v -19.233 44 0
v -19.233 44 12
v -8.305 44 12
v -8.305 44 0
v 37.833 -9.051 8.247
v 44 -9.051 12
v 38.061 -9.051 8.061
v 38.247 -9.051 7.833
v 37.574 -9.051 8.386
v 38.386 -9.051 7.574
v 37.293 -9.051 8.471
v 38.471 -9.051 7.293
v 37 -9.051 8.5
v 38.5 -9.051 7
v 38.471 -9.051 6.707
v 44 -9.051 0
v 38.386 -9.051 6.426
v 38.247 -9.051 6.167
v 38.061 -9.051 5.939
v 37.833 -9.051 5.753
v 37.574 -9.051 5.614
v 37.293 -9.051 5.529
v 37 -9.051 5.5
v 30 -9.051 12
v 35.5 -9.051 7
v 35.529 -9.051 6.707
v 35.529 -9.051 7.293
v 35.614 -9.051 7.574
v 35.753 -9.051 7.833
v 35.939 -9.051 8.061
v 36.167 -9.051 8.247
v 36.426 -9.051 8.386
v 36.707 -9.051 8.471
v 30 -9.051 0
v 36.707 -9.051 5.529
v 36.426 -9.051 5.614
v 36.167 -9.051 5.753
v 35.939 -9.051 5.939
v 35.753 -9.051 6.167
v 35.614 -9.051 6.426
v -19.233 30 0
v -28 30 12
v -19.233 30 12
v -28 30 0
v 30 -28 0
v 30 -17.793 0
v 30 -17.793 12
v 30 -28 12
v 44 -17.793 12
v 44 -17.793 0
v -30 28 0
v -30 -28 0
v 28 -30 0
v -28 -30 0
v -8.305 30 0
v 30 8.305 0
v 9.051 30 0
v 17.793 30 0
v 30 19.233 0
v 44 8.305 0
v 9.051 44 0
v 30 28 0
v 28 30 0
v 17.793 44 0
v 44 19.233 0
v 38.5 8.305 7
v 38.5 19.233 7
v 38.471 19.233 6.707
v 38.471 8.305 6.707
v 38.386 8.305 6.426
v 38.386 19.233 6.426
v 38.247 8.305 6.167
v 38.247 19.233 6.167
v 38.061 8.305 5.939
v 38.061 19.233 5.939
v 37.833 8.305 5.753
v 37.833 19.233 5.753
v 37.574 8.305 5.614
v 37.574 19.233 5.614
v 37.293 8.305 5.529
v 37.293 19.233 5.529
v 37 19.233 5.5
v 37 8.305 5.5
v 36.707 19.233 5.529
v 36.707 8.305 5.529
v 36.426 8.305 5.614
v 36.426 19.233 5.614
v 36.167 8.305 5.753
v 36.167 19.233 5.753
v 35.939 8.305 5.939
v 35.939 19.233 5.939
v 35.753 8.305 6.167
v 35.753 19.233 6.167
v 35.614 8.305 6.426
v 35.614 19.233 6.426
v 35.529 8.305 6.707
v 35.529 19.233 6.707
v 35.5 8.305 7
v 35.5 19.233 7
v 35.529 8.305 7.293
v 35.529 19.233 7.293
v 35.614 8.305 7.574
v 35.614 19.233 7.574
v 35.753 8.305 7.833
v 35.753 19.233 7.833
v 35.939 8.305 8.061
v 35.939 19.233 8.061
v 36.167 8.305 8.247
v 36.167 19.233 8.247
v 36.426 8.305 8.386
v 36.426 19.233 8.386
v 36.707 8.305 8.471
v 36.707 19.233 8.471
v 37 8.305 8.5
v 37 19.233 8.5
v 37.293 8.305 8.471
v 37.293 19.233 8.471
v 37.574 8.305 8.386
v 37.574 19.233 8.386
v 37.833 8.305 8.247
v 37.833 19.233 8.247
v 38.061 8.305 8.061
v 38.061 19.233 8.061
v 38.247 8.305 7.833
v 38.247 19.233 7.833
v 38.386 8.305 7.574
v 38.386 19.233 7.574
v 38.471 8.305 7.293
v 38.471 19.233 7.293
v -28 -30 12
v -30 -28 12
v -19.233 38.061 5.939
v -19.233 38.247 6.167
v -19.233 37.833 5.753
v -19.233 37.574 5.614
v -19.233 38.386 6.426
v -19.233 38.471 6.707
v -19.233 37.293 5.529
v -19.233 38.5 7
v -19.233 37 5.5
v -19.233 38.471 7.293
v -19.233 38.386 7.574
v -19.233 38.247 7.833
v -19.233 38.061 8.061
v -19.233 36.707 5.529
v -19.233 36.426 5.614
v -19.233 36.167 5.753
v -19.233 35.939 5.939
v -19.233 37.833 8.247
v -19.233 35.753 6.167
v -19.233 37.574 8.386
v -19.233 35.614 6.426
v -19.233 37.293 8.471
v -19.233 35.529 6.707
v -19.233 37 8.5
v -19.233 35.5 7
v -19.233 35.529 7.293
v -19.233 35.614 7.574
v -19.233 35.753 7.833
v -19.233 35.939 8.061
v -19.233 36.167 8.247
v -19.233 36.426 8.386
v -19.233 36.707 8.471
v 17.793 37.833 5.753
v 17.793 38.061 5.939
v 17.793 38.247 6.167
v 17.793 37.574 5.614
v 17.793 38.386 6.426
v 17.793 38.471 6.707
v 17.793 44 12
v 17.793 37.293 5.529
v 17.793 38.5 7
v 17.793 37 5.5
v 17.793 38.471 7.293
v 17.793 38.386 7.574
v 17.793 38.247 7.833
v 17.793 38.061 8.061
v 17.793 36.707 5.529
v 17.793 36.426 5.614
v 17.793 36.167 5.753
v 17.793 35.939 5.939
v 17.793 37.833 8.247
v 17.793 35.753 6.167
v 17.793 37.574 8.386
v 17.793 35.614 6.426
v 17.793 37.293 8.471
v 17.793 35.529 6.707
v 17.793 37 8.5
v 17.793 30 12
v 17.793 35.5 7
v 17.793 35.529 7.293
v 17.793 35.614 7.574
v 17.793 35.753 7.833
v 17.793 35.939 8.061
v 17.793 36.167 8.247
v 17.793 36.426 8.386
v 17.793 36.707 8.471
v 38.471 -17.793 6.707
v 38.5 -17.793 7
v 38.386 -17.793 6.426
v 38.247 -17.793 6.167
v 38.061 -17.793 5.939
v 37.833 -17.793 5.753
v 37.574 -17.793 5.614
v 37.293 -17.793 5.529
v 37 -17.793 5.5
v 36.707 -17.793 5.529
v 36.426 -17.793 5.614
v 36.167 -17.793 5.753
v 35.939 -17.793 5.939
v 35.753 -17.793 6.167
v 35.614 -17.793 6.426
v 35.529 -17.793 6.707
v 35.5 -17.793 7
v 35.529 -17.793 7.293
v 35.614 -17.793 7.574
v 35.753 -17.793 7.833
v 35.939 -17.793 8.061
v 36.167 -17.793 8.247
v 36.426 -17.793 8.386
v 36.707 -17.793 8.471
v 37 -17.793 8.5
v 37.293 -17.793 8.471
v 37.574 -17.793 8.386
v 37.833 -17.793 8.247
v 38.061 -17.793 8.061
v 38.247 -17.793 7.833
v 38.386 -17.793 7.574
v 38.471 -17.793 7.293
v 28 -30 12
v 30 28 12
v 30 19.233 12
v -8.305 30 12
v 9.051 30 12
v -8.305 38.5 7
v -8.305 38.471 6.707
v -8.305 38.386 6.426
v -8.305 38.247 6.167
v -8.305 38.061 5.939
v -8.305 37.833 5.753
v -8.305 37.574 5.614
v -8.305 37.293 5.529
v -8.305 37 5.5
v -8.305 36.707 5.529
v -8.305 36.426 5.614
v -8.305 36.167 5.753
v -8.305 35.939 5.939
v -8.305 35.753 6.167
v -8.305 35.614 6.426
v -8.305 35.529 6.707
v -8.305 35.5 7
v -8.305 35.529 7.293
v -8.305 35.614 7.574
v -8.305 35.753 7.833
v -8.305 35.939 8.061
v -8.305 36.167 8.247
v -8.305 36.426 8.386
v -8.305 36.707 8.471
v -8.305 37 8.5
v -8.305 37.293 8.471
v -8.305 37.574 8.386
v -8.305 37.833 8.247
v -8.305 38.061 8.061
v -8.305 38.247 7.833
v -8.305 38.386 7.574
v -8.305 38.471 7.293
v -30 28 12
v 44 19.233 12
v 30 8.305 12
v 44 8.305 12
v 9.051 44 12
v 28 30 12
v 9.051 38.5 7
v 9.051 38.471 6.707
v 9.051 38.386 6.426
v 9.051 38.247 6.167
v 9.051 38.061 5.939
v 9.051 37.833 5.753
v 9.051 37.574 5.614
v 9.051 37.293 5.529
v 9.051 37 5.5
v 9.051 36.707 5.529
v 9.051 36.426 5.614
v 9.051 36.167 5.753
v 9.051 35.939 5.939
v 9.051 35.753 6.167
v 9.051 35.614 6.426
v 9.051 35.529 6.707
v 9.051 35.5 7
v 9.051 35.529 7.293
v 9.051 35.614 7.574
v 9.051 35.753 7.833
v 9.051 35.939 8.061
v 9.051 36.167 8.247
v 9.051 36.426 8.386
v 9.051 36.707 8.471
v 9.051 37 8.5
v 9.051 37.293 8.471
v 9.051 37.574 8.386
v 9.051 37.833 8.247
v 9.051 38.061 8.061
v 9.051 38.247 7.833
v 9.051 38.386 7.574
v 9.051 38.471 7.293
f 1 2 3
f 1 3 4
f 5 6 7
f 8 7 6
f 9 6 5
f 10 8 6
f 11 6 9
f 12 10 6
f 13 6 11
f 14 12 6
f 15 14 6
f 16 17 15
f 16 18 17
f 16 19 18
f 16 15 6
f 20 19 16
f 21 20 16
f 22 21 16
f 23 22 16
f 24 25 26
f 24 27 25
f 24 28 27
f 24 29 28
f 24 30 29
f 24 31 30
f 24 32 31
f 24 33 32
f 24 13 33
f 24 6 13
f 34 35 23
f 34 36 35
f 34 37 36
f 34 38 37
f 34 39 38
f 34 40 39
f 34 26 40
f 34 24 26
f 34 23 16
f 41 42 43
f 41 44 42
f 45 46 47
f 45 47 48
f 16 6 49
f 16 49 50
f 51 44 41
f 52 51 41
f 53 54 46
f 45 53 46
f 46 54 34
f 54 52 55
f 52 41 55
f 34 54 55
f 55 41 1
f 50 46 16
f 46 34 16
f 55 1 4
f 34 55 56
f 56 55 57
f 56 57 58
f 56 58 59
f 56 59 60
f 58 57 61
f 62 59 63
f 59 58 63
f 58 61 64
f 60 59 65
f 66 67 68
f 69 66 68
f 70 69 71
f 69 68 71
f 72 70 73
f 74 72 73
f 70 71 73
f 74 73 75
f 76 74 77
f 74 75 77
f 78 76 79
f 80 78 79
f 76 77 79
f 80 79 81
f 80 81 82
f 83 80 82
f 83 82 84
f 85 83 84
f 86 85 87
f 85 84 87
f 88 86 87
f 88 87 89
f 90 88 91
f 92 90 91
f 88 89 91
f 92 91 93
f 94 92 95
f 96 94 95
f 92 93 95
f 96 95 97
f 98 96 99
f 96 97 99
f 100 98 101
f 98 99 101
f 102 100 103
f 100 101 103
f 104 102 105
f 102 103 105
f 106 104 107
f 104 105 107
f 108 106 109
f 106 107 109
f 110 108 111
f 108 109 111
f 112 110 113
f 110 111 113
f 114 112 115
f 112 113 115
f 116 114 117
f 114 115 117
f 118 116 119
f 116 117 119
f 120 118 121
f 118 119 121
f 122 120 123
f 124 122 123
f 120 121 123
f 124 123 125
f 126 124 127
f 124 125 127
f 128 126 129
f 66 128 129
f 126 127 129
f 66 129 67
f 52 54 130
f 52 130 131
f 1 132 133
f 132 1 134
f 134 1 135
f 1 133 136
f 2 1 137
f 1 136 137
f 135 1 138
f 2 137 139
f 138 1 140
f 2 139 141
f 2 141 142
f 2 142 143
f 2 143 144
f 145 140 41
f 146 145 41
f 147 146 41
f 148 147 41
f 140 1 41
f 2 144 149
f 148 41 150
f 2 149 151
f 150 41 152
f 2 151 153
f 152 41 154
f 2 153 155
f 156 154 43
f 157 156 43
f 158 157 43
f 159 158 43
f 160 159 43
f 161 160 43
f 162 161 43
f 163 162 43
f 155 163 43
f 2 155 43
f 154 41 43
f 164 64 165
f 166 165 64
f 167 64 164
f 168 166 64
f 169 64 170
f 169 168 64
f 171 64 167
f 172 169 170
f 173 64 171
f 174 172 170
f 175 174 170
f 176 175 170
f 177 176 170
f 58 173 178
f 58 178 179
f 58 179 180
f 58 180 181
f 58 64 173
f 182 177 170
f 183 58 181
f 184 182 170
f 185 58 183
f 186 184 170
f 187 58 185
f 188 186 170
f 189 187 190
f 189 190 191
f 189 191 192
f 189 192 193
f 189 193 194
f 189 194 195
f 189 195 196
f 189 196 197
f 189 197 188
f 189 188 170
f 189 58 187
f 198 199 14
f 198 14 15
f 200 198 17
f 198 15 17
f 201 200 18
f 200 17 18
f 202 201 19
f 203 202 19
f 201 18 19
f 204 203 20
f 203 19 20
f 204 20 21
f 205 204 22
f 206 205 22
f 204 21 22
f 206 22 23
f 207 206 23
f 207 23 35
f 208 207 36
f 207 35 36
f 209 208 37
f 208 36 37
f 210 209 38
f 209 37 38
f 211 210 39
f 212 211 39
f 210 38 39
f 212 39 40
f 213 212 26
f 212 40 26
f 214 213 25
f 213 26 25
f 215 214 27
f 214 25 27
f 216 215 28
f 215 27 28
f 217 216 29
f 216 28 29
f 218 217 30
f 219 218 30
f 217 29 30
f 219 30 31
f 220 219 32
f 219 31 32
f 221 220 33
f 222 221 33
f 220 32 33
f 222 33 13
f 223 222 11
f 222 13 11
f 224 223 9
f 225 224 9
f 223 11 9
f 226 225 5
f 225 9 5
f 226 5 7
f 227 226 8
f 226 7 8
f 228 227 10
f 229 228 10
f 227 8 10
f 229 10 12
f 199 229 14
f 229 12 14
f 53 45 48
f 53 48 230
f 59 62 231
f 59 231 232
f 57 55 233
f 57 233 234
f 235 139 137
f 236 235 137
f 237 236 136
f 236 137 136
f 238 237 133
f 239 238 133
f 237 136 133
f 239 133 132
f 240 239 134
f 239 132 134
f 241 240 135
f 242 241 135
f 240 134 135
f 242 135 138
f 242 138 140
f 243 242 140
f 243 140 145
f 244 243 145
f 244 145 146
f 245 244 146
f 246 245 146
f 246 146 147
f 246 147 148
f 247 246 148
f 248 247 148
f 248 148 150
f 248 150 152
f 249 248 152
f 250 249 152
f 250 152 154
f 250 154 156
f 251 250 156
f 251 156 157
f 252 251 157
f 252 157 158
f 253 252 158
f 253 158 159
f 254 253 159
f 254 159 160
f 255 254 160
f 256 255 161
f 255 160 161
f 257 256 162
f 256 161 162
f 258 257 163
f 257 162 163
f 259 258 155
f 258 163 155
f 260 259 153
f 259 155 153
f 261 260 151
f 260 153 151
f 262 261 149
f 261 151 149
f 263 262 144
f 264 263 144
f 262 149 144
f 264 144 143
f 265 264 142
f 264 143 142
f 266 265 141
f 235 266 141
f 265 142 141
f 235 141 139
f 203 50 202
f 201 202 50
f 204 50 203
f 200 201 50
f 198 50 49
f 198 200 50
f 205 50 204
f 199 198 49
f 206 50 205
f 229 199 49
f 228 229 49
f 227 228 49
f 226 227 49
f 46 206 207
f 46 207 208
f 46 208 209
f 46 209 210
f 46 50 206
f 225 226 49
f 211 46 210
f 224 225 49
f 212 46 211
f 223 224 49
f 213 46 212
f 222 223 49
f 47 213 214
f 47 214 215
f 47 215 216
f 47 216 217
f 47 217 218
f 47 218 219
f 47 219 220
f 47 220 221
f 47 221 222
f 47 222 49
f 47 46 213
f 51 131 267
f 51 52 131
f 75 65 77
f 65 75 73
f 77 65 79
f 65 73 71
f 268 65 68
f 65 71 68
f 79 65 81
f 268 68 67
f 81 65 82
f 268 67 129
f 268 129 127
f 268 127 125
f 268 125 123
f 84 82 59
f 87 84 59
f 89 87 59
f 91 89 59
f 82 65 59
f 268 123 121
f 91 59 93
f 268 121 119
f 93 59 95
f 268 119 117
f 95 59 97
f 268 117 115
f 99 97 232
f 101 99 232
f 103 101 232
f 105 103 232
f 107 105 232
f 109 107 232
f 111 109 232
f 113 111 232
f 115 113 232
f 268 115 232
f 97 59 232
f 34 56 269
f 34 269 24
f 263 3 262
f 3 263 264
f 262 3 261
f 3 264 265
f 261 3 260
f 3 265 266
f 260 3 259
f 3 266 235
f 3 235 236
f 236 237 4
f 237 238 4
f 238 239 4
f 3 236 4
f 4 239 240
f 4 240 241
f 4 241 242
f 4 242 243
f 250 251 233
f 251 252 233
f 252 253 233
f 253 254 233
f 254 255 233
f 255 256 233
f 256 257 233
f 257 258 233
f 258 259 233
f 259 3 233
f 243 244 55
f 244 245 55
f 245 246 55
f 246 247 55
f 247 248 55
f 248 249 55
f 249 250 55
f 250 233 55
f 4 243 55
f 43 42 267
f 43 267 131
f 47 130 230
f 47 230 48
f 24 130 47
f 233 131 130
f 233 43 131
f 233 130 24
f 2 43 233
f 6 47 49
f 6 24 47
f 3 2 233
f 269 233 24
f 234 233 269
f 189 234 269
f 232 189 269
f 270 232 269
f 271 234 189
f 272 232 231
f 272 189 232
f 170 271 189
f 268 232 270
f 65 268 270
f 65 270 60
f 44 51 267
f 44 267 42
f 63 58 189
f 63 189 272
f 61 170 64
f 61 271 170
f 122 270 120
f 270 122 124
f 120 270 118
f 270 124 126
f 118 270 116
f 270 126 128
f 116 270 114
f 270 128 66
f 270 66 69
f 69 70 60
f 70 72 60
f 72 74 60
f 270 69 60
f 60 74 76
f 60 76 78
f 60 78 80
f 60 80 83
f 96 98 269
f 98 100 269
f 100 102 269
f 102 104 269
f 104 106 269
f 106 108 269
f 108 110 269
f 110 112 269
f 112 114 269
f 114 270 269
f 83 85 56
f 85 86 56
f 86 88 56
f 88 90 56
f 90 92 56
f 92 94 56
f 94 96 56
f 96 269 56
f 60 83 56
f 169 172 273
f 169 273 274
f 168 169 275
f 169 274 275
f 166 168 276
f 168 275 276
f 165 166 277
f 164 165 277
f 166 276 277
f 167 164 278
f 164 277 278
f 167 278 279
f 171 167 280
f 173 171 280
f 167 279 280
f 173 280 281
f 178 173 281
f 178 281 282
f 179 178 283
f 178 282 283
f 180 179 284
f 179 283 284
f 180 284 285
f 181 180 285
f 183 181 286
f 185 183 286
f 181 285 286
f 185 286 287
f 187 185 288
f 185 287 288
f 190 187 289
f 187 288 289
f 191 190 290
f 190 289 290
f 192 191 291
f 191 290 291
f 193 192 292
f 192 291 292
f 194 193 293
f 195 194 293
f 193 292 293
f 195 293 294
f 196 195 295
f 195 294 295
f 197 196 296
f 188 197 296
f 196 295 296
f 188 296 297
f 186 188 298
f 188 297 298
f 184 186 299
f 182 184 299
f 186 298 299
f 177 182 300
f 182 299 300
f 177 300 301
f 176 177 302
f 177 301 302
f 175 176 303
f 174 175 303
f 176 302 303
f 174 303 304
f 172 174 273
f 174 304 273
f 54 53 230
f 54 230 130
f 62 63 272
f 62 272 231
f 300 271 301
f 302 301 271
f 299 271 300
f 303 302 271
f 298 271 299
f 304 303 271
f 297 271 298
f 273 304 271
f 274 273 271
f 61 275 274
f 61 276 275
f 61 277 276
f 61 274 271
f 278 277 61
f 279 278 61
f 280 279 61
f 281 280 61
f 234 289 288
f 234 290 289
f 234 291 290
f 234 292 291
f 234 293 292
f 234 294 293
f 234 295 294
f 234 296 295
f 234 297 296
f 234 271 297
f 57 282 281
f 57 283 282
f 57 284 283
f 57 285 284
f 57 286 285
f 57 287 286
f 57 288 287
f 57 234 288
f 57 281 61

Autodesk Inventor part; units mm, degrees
ref_plane "YZ Plane" through (0, 0, 0) normal (1, 0, 0) x (0, 1, 0)
ref_plane "XZ Plane" through (0, 0, 0) normal (0, 1, 0) x (-1, 0, 0)
ref_plane "XY Plane" through (0, 0, 0) normal (0, 0, 1) x (1, 0, 0)
ref_plane "Work Plane1" through (0, 0, 0) normal (0, 0, 1) x (1, 0, 0)
sketch "Sketch1" plane through (0, 0, 0) normal (0, 0, 1) x (1, 0, 0)
  circle A0 centre (0, 0) radius 7.5 projected
  line L0 (-30, 28) -> (-28, 30) projected
  line L1 (-30, -28) -> (-30, 28) projected
  line L2 (-28, -30) -> (-30, -28) projected
  line L3 (28, -30) -> (-28, -30) projected
  line L4 (30, -28) -> (28, -30) projected
  line L5 (30, 28) -> (30, -28) projected
  line L6 (28, 30) -> (30, 28) projected
  line L7 (-28, 30) -> (28, 30) projected
  circle A1 centre (-25, 0) radius 1.3 projected
  circle A2 centre (25, 0) radius 1.3 projected
extrude "Extrusion1" add sketch "Sketch1" along normal blind 12 contours A0 | L0 L7 L6 L5 L4 L3 L2 L1 | A1 | A2
sketch "Sketch2" plane through (0, 0, 12) normal (0, 0, 1) x (1, 0, 0)
  point P0 (0, 0)
sketch "Sketch3" plane through (30, -28, 0) normal (1, 0, 0) x (0, 0, -1)
  line L0 (0, 56) -> (0, 0) projected
  line L1 (0, 56) -> (-12, 56) projected
  line L2 (-12, 0) -> (-12, 56) projected
  line L3 (0, 0) -> (-12, 0) projected
  line L4 (-12, 0) -> (-12, 56) projected
  line L5 (0, 47.2331) -> (-12, 47.2331)
  line L6 (-12, 47.2331) -> (-12, 36.3051)
  line L7 (-12, 36.3051) -> (0, 36.3051)
  line L8 (0, 36.3051) -> (0, 47.2331)
  line L9 (0, 56) -> (0, 0) projected
  line L10 (0, 10.2066) -> (-12, 10.2066)
  line L11 (-12, 10.2066) -> (-12, 18.9489)
  line L12 (-12, 18.9489) -> (0, 18.9489)
  line L13 (0, 18.9489) -> (0, 10.2066)
  point P0 (0, 28)
extrude "Extrusion2" add sketch "Sketch3" along normal blind 14 contours L0 L7 L2 L5 | L0 L10 L2 L12
sketch "Sketch4" plane through (30, 19.2331, 12) normal (0, 1, 0) x (1, 0, 0)
  line L0 (0, 0) -> (0, 12) projected
  line L1 (0, 0) -> (14, 0) projected
  line L2 (14, 12) -> (14, 0) projected
  line L3 (0, 12) -> (14, 12) projected
  circle A0 centre (7, 5) radius 1.5
  point P0 (-30, 12)
  dimension "d4" = 3
extrude "Extrusion3" cut sketch "Sketch4" against normal through all contours A0
pattern_circular "Circular Pattern1" count 2 over 90 about axis through (0, 0, 0) along (0, 0, 1) of "Extrusion2", "Extrusion3"
properties part number "00_XY_stage-CHUO_SEIKI_LD-647-R1-Middle"
